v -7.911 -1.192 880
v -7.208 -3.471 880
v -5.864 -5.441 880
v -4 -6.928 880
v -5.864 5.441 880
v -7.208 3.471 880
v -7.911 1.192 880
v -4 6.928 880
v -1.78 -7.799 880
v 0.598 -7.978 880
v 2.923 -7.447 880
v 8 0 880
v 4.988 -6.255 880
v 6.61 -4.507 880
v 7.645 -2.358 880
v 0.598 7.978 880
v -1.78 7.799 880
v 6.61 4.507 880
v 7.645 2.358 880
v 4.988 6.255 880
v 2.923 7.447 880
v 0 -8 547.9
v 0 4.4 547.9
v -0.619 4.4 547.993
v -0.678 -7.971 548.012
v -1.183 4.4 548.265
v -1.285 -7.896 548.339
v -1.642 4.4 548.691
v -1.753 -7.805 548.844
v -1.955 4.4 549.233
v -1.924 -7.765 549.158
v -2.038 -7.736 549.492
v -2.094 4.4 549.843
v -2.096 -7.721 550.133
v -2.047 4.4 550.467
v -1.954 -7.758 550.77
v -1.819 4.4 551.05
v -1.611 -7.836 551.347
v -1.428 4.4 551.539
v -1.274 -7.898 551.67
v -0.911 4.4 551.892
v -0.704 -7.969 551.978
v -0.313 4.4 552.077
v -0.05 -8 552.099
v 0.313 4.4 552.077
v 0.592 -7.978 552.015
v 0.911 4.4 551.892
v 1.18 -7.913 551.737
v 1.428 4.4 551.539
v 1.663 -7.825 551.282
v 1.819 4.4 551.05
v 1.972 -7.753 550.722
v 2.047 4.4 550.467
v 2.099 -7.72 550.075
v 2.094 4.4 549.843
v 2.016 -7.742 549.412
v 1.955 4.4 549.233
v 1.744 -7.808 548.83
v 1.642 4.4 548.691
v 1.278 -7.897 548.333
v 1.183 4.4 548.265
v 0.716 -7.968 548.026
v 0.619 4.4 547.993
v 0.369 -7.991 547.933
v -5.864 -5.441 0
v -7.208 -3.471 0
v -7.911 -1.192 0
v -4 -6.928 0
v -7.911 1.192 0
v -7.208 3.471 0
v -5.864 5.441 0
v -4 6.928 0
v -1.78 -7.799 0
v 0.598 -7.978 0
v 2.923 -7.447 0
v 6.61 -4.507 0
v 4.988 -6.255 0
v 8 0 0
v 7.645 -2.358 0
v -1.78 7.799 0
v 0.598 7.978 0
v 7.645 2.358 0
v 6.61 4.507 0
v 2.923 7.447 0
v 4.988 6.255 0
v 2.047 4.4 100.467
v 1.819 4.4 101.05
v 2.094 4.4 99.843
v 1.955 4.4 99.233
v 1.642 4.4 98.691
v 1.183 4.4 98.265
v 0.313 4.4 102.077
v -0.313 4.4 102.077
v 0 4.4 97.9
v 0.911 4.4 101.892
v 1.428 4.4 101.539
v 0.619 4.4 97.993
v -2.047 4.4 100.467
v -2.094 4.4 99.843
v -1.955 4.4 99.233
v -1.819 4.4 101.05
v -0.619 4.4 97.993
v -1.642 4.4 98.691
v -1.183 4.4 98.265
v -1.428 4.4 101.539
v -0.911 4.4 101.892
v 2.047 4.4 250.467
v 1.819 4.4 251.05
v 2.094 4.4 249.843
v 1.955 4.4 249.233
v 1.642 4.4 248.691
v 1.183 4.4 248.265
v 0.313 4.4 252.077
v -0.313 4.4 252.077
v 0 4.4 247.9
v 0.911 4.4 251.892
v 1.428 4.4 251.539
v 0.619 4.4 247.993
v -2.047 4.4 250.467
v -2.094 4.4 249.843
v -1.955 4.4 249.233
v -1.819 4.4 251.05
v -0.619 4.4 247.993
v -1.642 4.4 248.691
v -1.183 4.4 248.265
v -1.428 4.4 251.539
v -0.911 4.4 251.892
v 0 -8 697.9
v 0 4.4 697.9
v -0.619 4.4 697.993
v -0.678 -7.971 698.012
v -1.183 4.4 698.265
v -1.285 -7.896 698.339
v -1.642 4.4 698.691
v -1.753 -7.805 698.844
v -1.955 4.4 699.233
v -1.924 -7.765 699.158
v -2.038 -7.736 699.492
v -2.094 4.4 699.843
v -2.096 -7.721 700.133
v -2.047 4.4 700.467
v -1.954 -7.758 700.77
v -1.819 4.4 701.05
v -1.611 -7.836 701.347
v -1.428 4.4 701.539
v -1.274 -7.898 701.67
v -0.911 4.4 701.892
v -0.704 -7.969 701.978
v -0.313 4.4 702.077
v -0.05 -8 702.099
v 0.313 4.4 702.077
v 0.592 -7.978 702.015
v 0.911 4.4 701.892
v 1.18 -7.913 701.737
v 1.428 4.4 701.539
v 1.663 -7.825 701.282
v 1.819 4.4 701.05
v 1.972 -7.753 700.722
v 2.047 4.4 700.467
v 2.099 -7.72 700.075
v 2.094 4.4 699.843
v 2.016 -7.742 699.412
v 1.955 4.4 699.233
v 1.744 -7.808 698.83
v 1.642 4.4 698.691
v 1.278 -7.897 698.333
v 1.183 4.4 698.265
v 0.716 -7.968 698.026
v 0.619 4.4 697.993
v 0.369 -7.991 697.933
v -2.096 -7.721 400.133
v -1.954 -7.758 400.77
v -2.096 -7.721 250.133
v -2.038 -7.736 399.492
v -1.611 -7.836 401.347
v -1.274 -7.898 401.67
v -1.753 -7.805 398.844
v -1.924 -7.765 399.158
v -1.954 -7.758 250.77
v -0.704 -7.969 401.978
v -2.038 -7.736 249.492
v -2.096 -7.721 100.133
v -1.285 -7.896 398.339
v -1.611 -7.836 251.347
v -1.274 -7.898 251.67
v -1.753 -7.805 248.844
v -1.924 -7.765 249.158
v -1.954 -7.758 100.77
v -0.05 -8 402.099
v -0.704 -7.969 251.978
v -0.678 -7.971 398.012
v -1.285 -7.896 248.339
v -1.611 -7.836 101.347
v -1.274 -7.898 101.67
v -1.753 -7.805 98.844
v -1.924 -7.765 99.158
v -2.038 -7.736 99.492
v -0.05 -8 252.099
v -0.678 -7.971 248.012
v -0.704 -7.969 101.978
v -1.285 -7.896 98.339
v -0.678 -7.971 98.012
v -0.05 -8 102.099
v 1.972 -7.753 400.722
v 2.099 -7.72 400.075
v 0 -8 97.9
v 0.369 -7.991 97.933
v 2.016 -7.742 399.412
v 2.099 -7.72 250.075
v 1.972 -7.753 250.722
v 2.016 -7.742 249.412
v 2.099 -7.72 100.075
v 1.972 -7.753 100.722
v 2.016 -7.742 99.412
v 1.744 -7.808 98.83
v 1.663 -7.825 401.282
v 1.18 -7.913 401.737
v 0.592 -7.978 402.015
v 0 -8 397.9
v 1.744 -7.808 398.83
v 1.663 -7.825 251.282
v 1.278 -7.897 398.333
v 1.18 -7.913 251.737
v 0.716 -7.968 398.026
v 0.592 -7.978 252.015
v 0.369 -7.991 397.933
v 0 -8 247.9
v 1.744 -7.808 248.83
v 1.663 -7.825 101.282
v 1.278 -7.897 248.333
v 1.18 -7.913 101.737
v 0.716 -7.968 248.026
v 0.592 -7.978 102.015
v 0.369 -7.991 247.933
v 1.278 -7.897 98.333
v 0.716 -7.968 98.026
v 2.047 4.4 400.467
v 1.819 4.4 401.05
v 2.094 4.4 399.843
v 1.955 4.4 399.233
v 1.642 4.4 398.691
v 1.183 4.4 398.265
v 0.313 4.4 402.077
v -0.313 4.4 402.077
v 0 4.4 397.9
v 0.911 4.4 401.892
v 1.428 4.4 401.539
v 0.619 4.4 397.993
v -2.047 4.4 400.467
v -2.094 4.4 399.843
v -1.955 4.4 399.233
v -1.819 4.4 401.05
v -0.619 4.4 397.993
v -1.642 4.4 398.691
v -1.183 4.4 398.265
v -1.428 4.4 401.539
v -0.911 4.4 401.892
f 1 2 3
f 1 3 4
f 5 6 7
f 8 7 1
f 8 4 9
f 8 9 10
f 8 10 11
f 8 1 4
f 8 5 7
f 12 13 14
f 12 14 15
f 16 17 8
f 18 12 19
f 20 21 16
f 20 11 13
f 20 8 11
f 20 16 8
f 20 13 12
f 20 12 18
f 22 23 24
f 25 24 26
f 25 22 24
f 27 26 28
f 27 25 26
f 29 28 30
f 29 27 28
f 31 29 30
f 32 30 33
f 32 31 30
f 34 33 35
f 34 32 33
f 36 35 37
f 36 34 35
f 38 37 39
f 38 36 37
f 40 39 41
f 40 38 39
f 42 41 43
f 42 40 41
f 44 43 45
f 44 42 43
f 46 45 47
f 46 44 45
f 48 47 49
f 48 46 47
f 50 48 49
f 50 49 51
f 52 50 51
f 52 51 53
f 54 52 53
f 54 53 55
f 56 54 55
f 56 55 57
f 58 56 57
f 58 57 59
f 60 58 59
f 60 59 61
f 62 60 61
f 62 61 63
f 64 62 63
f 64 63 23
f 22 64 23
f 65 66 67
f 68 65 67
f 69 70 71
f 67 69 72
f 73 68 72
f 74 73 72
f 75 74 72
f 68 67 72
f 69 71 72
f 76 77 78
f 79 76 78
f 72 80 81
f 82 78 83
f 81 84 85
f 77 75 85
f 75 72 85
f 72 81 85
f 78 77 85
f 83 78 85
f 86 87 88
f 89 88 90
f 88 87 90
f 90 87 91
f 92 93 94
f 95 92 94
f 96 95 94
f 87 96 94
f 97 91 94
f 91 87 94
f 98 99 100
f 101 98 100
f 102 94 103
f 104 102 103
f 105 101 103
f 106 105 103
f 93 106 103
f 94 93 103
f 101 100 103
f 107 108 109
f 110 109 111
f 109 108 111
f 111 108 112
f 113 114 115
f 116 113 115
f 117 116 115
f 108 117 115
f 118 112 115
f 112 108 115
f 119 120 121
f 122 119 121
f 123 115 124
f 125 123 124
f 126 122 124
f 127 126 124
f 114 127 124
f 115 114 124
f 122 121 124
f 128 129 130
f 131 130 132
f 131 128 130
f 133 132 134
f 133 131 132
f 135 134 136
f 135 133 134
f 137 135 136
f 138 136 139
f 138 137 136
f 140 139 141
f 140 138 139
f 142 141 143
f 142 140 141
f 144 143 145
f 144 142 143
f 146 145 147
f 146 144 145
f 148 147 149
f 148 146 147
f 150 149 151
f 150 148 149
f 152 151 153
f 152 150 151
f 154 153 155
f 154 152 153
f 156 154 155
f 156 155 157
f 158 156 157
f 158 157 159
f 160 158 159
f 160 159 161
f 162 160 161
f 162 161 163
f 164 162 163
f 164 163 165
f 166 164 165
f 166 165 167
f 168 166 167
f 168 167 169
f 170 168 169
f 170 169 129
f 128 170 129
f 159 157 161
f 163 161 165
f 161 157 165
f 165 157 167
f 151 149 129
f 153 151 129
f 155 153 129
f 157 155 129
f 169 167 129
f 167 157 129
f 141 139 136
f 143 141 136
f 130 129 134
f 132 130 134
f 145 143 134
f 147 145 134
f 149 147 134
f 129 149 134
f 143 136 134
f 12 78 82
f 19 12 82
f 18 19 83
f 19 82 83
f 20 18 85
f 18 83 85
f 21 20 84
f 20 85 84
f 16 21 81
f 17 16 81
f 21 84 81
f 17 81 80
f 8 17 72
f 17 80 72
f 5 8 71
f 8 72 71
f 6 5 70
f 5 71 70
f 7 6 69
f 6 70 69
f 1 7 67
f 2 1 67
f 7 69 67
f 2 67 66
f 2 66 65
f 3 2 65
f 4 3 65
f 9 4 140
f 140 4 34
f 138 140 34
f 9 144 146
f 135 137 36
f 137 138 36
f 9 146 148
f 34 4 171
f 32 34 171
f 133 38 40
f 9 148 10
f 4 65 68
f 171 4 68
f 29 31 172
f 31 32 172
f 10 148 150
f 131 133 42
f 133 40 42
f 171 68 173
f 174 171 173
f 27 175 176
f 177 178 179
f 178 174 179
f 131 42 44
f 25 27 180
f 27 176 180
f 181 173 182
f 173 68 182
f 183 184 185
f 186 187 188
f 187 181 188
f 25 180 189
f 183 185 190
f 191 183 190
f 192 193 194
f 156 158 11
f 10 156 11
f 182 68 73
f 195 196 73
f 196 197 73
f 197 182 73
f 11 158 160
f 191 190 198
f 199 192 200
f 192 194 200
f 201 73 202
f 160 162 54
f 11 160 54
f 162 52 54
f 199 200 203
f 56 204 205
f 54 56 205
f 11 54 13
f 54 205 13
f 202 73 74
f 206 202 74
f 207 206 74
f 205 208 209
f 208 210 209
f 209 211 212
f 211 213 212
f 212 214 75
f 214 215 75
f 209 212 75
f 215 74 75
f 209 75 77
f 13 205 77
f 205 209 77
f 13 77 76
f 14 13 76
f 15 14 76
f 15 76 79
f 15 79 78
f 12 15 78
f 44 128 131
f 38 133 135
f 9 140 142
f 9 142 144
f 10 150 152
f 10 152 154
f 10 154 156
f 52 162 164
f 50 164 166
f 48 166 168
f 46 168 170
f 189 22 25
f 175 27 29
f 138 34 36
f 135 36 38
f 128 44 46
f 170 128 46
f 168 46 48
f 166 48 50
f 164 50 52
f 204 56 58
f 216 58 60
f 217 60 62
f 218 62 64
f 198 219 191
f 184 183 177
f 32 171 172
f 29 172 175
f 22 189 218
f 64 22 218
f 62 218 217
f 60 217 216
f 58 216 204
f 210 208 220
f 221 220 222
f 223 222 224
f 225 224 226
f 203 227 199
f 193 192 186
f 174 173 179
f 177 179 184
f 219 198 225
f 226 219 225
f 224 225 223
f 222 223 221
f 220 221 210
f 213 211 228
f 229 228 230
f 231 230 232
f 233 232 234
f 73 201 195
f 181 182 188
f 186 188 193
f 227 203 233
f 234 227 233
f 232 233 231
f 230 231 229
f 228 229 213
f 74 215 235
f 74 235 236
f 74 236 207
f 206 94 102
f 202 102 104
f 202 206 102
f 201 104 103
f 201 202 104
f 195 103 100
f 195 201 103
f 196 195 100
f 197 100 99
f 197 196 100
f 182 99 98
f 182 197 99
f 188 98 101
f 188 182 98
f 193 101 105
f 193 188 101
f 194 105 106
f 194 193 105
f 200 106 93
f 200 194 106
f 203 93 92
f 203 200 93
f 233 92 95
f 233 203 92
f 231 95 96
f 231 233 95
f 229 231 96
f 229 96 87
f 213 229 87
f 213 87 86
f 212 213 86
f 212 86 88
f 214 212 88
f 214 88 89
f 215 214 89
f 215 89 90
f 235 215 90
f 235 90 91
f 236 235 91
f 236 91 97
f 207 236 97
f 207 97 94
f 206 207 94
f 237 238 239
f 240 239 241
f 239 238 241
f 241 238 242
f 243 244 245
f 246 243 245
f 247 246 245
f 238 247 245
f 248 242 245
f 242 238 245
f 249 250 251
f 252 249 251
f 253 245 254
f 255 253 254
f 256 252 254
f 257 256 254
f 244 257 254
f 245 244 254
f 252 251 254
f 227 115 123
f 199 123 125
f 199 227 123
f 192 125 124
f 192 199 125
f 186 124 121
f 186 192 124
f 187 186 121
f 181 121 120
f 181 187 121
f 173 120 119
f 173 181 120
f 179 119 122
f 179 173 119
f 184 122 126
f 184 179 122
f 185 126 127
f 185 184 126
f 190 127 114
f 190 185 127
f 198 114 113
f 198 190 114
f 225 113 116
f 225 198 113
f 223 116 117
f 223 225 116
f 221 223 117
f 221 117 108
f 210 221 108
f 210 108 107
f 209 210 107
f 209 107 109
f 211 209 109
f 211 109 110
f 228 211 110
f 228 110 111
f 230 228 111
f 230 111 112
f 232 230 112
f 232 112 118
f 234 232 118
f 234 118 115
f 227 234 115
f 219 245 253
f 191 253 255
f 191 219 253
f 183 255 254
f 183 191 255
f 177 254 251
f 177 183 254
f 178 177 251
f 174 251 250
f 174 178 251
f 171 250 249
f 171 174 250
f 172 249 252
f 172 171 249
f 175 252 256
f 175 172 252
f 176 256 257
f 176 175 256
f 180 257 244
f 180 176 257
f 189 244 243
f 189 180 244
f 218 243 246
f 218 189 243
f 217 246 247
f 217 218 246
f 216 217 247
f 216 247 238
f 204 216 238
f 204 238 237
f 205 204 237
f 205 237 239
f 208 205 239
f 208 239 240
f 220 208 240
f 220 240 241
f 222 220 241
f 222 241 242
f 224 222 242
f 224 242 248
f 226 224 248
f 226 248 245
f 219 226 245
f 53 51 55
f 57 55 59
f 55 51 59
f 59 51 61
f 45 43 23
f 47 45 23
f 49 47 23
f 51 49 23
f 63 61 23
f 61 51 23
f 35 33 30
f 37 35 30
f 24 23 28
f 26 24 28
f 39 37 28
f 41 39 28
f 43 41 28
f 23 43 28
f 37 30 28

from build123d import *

# Parameters (mm, degrees)
SKETCH1_R           = 8
BOSS_EXTRUDE1_DEPTH = 880
SKETCH4_R           = 2.1
CUT_EXTRUDE2_DEPTH  = 12.4
LPATTERN1_COUNT     = 5
LPATTERN1_PITCH     = 150


with BuildPart() as part:
    # Sketch1 → Boss-Extrude1 (new body)
    with BuildSketch(Plane.XY):
        Circle(SKETCH1_R)
    extrude(amount=BOSS_EXTRUDE1_DEPTH)

    # Sketch4 → Cut-Extrude2 (cut)
    with BuildSketch(Plane(origin=(0, -8, 0), x_dir=(-1, 0, 0), z_dir=(0, 1, 0))):
        with Locations(Location((0, 100, 0), (0, 0, 270))):
            Circle(SKETCH4_R)
    cut_extrude2 = extrude(amount=CUT_EXTRUDE2_DEPTH, mode=Mode.SUBTRACT)

    # LPattern1: Cut-Extrude2 ×5
    with Locations(*[(0, 0, i * LPATTERN1_PITCH) for i in range(1, LPATTERN1_COUNT)]):
        add(cut_extrude2, mode=Mode.SUBTRACT)


solid = part.part
